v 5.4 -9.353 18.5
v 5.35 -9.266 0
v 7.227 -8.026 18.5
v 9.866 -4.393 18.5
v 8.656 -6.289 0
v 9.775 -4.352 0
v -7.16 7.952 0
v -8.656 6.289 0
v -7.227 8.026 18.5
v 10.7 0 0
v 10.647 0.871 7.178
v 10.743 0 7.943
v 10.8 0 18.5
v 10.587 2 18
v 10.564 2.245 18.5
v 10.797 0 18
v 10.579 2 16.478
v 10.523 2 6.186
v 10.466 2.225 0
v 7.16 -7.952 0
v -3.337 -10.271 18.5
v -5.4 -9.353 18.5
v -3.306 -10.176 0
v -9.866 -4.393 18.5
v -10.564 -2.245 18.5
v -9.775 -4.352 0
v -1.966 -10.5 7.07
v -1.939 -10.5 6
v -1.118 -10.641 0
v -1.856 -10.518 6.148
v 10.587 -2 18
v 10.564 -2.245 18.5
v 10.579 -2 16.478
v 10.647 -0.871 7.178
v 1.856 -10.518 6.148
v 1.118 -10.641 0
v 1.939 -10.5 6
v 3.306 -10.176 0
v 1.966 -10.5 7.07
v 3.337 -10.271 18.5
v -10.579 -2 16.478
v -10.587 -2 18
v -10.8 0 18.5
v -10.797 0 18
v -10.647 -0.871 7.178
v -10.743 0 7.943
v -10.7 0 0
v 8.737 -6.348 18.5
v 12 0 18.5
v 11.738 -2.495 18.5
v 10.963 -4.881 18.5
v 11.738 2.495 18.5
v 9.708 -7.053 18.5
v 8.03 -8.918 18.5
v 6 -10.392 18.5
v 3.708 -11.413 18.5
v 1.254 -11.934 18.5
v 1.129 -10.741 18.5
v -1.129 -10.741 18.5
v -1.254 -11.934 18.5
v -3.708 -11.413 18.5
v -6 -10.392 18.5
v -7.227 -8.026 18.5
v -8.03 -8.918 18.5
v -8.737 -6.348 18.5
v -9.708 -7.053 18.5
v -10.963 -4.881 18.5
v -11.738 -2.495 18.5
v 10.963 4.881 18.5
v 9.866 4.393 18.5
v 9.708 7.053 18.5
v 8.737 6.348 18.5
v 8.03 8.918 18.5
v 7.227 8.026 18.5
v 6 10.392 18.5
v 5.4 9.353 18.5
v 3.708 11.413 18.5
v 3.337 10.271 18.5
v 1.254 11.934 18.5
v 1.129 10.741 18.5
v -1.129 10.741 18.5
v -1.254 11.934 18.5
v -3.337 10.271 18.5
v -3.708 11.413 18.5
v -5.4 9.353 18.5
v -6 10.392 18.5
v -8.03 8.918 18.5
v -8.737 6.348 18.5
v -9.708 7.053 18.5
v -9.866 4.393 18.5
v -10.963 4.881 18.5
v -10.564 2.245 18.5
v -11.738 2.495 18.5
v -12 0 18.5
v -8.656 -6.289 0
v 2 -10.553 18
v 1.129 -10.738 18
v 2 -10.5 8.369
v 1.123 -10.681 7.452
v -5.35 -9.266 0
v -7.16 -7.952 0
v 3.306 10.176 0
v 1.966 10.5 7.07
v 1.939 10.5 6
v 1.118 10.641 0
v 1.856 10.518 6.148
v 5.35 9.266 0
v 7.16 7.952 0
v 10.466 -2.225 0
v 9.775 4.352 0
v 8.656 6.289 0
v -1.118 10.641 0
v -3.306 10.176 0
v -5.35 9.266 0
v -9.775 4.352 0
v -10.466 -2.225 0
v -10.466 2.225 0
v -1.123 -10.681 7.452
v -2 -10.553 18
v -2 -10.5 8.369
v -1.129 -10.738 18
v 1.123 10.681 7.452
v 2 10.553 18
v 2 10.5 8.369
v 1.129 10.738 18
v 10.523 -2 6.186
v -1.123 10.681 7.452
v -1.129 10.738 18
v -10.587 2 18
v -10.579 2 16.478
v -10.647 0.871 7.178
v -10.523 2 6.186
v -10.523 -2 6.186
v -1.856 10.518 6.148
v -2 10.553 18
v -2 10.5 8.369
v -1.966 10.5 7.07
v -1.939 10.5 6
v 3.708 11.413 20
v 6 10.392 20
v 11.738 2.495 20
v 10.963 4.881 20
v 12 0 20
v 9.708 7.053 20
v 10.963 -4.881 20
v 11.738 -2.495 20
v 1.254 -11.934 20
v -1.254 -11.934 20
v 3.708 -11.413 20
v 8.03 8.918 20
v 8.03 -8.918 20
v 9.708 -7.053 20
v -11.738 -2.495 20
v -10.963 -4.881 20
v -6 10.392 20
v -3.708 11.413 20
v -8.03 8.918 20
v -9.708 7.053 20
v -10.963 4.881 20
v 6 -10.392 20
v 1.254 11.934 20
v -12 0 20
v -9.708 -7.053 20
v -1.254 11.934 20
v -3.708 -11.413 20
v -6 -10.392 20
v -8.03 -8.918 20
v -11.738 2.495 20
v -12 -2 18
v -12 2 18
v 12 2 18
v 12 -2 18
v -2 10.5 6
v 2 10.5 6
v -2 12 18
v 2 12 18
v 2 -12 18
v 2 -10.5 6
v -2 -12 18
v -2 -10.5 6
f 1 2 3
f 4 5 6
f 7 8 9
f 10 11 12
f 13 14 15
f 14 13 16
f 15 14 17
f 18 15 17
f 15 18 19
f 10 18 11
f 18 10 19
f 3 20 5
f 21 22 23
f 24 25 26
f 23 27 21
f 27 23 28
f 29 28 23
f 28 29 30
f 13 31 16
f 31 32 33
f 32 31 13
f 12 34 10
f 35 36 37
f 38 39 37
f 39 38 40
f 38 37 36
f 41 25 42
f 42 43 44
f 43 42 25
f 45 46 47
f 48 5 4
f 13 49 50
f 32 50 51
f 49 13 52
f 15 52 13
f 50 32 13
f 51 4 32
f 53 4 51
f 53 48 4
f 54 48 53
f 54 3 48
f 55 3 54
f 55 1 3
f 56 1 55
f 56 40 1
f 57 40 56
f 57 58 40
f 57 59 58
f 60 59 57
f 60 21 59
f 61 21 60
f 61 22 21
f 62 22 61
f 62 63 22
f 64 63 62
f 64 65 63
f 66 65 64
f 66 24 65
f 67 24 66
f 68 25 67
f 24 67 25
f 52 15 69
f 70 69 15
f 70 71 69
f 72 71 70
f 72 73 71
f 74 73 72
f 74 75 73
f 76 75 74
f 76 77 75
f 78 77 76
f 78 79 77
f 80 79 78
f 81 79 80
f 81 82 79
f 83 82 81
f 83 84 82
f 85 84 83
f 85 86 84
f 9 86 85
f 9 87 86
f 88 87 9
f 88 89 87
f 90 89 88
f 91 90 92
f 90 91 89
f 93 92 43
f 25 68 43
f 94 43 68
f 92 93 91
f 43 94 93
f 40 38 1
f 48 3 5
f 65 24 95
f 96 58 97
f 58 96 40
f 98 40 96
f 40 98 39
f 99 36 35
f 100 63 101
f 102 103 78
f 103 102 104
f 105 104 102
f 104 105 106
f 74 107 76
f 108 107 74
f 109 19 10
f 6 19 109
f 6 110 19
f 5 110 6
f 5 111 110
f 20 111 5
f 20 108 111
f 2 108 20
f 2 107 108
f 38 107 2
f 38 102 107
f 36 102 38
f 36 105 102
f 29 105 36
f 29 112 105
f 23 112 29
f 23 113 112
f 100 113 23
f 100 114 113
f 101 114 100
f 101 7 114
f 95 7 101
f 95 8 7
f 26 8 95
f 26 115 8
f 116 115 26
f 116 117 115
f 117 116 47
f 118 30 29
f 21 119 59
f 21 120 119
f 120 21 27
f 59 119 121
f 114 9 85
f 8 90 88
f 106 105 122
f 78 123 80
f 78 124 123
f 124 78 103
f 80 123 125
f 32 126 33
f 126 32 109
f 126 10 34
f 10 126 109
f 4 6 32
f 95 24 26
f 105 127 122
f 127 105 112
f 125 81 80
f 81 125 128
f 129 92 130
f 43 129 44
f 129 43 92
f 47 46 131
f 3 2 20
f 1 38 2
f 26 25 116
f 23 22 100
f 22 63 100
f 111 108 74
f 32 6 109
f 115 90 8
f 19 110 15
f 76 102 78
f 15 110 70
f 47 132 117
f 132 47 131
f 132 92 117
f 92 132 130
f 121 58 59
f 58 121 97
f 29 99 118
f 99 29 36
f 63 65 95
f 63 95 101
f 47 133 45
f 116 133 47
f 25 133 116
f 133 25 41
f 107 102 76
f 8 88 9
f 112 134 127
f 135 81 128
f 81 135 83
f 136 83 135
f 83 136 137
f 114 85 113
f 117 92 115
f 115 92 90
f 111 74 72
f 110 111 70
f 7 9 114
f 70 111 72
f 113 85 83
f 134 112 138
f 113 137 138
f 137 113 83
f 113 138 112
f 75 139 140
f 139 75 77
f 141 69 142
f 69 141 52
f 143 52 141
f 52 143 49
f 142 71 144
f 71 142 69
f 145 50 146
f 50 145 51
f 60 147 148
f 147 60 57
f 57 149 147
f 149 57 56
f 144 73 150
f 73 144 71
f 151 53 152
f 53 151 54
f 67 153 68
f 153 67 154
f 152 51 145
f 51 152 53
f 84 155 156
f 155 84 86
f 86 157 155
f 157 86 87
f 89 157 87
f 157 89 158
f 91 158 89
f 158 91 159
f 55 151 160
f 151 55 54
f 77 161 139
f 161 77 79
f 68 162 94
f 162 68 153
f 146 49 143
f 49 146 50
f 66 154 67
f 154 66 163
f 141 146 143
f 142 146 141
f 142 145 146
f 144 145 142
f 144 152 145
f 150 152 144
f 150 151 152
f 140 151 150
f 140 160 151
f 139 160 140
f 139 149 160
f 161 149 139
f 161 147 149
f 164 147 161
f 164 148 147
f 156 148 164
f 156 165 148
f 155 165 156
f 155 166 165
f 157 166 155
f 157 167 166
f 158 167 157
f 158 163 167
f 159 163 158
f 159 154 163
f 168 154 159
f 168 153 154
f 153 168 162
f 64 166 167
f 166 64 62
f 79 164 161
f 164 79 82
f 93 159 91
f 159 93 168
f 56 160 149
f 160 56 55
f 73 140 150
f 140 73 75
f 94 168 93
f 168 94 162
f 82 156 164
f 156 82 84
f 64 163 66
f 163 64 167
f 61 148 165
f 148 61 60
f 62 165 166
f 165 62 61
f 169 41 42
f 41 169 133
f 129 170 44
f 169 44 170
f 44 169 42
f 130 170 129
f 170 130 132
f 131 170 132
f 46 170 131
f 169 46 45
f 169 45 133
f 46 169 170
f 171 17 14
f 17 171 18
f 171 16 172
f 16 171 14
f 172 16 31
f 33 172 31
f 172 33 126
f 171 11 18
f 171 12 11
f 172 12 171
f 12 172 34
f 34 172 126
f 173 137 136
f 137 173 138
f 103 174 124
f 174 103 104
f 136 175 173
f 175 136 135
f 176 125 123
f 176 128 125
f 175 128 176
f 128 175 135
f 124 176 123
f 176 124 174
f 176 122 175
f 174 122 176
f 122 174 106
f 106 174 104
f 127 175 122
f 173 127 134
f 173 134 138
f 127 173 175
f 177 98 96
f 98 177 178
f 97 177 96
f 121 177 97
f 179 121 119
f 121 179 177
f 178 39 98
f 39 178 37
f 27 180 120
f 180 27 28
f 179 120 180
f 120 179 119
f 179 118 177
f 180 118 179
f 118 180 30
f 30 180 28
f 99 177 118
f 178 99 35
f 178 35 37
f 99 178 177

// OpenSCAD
jsnhr04();

module jsnhr04()
{
  cylinder(h=18.5, d1=21.4, d2=21.6);
  translate([0,0,18.5])cylinder(h=1.5, d=24);
  CubePoints = [
    [  0,  0, 0 ],  //0
    [  4,  0, 0 ],  //1
    [  4,  0, 12 ],  //2
    [  0,  0, 12 ],  //3
    [  0,  1.5, 12 ],  //4
    [  4,  1.5, 12 ],  //5
  ]; //7

  CubeFaces = [
    [0,3,2,1],  // back
    [0,1,5,4],  // front
    [1,2,5,1],  // left side
    [0,4,3,0],  // right
    [2,3,4,5],  // top
  ];

  translate([-10.5,-2,6])
    rotate([0,0,90])
    polyhedron( CubePoints, CubeFaces );
  translate([10.5,2,6])
    rotate([0,0,-90])
    polyhedron( CubePoints, CubeFaces );
  translate([-2,10.5,6])
    rotate([0,0,00])
    polyhedron( CubePoints, CubeFaces );
  translate([2,-10.5,6])
    rotate([0,0,180])
    polyhedron( CubePoints, CubeFaces );

}
